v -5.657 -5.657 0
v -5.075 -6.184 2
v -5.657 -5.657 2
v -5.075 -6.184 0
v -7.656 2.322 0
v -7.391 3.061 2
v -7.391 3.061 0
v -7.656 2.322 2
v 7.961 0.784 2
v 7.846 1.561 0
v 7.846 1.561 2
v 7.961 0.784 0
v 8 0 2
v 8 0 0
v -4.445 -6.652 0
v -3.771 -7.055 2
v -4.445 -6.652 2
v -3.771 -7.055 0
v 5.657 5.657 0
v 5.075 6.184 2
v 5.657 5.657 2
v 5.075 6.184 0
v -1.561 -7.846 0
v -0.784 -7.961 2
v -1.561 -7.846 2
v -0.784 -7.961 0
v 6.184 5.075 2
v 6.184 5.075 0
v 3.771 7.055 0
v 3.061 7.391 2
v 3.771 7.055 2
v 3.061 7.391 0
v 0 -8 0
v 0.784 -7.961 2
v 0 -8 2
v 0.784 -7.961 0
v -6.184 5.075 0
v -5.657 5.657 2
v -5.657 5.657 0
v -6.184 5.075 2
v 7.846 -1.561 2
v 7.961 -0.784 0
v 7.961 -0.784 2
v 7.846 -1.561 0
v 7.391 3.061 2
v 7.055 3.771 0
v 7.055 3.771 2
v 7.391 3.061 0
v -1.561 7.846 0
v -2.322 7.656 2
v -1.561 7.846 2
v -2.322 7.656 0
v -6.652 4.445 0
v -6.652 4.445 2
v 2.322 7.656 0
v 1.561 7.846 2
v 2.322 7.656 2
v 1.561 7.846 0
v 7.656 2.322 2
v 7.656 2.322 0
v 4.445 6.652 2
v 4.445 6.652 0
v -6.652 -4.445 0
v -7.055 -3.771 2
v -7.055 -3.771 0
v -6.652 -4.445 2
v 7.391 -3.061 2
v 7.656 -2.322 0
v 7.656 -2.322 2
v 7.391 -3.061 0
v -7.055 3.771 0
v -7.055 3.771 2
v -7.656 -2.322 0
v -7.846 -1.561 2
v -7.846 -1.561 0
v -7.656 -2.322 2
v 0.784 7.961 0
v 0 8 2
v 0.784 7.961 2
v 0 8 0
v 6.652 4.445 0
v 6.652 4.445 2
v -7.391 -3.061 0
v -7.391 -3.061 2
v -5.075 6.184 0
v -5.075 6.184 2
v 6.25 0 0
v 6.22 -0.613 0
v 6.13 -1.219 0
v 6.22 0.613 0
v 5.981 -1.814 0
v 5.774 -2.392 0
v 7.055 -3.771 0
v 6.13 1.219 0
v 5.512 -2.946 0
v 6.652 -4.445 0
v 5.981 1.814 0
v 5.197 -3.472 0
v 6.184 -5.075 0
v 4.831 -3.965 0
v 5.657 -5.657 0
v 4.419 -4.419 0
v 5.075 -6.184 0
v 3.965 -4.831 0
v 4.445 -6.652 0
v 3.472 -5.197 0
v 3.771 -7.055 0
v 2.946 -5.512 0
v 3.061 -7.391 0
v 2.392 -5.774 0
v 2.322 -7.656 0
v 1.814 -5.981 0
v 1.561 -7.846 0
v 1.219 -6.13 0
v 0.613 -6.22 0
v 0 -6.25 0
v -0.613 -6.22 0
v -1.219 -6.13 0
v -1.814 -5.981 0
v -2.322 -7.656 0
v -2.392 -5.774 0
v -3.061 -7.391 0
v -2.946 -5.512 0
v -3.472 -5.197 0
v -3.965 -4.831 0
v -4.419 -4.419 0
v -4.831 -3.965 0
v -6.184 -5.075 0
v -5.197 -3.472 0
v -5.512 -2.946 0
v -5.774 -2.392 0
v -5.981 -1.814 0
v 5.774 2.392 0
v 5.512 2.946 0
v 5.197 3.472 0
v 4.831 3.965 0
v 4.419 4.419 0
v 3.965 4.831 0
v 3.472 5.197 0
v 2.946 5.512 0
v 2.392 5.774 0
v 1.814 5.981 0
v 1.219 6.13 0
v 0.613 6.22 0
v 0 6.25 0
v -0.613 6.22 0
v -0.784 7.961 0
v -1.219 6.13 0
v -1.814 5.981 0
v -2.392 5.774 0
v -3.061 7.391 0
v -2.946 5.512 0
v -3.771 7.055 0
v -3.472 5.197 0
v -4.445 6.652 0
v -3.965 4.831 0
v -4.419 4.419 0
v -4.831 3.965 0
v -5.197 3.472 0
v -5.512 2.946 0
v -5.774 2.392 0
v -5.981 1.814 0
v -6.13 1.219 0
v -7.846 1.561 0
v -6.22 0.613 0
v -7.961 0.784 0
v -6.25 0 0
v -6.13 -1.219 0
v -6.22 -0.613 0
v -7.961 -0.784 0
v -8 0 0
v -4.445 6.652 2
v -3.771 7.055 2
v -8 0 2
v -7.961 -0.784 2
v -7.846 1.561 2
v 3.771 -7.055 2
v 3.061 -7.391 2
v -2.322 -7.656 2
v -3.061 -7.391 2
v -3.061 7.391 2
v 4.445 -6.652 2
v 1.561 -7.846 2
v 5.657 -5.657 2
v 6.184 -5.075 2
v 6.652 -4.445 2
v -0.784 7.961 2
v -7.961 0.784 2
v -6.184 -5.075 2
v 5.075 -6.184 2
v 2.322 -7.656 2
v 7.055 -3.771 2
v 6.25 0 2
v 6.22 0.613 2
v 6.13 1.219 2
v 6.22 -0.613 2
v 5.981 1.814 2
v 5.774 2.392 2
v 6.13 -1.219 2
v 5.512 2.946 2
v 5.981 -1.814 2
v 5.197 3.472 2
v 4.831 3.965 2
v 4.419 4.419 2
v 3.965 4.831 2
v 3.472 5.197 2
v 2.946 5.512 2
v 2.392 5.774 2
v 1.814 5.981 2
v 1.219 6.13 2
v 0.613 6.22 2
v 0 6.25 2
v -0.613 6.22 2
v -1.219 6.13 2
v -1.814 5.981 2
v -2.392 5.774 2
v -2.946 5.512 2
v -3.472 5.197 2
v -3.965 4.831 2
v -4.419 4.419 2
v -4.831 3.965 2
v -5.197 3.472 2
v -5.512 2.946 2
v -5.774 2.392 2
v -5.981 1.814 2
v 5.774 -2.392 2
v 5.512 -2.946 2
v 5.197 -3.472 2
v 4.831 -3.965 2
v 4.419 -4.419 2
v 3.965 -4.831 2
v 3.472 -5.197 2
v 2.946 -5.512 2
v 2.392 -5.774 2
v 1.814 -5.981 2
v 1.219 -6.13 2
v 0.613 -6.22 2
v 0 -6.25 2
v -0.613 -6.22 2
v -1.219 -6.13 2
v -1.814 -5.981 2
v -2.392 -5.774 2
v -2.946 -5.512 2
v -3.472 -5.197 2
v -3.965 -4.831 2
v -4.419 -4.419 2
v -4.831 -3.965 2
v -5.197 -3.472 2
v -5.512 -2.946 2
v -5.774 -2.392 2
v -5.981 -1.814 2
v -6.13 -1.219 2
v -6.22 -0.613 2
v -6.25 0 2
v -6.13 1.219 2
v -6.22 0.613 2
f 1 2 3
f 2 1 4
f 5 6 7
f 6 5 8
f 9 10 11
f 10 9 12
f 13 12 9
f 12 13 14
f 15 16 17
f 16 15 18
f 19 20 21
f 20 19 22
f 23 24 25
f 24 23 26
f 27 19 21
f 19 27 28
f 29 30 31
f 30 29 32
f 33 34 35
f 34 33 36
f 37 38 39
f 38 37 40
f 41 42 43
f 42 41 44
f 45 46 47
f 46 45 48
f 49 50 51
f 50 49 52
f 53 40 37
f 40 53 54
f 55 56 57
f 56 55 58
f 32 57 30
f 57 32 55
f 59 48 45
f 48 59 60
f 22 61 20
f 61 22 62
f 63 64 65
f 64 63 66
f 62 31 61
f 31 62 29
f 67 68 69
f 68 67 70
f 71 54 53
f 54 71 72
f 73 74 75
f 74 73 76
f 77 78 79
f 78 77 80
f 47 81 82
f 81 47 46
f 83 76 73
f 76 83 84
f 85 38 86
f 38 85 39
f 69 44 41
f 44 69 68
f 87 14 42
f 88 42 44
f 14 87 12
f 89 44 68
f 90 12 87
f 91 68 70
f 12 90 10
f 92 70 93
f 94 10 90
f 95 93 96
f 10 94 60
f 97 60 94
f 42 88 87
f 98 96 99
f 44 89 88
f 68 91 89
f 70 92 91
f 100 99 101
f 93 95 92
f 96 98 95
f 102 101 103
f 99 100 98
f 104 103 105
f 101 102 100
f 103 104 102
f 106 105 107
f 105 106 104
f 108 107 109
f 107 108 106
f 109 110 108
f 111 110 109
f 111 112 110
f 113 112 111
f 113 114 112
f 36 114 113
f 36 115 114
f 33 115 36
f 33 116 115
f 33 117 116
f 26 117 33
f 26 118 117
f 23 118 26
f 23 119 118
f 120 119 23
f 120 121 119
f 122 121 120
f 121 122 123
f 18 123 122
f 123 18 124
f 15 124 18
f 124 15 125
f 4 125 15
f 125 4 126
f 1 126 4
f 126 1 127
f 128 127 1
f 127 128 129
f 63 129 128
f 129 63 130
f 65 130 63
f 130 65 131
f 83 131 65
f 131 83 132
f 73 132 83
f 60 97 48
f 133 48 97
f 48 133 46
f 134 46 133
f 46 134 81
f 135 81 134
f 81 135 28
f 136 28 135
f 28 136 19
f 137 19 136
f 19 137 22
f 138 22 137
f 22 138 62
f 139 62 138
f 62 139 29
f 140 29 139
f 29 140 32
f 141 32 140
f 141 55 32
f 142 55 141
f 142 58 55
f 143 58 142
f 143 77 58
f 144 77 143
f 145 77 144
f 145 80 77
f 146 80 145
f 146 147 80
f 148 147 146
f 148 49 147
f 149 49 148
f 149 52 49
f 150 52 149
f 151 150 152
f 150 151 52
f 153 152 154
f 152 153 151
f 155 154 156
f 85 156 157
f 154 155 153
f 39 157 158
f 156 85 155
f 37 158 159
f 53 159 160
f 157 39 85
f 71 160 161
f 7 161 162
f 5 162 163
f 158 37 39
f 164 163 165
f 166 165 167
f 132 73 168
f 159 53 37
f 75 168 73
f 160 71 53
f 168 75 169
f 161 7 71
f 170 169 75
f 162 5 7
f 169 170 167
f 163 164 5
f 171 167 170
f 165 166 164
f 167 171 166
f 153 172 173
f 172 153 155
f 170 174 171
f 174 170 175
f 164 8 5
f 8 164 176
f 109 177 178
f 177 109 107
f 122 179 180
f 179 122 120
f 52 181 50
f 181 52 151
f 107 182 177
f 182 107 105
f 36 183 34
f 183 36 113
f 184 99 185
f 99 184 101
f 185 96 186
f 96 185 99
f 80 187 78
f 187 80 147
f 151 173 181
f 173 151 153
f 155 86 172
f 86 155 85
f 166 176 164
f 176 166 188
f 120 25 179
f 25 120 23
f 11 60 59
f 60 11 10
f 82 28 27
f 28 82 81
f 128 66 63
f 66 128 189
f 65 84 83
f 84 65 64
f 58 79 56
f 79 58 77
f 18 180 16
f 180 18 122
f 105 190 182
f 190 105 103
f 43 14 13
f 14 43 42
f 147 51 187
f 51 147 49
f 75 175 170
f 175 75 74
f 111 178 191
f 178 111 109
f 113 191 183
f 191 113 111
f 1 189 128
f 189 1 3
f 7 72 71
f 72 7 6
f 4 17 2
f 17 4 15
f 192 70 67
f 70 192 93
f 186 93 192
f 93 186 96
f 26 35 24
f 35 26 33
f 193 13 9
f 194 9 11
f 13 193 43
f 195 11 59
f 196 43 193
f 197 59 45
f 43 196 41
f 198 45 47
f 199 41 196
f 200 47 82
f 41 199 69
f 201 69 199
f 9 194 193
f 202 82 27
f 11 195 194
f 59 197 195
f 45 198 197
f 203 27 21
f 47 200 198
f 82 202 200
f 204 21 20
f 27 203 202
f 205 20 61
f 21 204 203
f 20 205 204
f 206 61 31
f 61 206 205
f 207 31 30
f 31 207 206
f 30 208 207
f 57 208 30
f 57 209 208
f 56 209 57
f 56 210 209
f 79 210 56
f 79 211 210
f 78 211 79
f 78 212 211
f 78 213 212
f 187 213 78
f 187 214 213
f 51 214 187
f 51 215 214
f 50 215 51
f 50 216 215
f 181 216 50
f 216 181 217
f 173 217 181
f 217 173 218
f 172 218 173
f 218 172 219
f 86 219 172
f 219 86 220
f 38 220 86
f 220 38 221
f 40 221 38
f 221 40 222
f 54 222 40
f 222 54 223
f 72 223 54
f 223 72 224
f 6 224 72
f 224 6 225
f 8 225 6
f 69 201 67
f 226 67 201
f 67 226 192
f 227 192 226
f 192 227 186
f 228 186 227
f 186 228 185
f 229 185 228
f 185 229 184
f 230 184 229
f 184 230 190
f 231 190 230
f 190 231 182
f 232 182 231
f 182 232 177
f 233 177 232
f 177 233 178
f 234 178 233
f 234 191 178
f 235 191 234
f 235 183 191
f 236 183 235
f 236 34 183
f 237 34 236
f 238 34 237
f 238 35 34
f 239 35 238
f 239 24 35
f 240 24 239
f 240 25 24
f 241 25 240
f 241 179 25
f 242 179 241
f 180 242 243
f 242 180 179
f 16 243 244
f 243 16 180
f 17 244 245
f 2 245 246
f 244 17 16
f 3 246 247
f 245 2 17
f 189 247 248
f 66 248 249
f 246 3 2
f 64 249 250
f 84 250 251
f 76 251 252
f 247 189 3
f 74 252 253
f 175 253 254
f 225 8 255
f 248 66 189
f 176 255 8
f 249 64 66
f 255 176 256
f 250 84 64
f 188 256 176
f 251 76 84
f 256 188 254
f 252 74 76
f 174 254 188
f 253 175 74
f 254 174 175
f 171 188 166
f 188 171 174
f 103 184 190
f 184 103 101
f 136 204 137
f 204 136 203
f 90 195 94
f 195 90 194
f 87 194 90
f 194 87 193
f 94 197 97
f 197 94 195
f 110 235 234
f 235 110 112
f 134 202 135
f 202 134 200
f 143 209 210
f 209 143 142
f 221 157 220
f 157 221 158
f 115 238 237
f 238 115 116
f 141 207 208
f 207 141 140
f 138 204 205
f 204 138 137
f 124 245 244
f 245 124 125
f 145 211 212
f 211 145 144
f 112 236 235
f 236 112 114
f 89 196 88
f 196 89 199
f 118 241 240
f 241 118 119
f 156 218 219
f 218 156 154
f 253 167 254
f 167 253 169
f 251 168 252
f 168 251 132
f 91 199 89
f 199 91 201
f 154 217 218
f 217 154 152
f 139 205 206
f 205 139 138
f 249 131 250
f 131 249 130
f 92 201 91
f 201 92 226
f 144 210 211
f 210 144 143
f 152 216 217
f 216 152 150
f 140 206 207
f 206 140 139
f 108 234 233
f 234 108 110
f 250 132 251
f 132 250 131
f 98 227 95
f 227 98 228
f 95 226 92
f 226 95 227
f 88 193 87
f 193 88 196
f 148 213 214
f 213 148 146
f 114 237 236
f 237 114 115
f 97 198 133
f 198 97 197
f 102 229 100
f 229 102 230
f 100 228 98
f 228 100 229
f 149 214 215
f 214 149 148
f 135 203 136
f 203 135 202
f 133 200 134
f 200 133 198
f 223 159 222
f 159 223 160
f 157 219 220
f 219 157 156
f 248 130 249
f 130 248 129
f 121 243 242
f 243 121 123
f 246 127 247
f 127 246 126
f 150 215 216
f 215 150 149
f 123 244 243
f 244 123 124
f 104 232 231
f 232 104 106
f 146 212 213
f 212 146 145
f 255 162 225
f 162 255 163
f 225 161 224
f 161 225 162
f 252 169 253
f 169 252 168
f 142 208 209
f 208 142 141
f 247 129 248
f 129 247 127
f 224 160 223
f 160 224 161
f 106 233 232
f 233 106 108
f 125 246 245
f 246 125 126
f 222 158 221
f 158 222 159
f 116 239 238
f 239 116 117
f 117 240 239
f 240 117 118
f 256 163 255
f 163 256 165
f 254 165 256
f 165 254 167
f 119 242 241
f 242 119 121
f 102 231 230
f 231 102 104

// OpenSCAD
$fn = $preview ? 32 : 64;

tykkelse = 2;
indre_dim = 12.5;
ytre_dim = 16;

difference() {
    cylinder(h=2, d=ytre_dim);
    cylinder(h=2, d=indre_dim);
}
